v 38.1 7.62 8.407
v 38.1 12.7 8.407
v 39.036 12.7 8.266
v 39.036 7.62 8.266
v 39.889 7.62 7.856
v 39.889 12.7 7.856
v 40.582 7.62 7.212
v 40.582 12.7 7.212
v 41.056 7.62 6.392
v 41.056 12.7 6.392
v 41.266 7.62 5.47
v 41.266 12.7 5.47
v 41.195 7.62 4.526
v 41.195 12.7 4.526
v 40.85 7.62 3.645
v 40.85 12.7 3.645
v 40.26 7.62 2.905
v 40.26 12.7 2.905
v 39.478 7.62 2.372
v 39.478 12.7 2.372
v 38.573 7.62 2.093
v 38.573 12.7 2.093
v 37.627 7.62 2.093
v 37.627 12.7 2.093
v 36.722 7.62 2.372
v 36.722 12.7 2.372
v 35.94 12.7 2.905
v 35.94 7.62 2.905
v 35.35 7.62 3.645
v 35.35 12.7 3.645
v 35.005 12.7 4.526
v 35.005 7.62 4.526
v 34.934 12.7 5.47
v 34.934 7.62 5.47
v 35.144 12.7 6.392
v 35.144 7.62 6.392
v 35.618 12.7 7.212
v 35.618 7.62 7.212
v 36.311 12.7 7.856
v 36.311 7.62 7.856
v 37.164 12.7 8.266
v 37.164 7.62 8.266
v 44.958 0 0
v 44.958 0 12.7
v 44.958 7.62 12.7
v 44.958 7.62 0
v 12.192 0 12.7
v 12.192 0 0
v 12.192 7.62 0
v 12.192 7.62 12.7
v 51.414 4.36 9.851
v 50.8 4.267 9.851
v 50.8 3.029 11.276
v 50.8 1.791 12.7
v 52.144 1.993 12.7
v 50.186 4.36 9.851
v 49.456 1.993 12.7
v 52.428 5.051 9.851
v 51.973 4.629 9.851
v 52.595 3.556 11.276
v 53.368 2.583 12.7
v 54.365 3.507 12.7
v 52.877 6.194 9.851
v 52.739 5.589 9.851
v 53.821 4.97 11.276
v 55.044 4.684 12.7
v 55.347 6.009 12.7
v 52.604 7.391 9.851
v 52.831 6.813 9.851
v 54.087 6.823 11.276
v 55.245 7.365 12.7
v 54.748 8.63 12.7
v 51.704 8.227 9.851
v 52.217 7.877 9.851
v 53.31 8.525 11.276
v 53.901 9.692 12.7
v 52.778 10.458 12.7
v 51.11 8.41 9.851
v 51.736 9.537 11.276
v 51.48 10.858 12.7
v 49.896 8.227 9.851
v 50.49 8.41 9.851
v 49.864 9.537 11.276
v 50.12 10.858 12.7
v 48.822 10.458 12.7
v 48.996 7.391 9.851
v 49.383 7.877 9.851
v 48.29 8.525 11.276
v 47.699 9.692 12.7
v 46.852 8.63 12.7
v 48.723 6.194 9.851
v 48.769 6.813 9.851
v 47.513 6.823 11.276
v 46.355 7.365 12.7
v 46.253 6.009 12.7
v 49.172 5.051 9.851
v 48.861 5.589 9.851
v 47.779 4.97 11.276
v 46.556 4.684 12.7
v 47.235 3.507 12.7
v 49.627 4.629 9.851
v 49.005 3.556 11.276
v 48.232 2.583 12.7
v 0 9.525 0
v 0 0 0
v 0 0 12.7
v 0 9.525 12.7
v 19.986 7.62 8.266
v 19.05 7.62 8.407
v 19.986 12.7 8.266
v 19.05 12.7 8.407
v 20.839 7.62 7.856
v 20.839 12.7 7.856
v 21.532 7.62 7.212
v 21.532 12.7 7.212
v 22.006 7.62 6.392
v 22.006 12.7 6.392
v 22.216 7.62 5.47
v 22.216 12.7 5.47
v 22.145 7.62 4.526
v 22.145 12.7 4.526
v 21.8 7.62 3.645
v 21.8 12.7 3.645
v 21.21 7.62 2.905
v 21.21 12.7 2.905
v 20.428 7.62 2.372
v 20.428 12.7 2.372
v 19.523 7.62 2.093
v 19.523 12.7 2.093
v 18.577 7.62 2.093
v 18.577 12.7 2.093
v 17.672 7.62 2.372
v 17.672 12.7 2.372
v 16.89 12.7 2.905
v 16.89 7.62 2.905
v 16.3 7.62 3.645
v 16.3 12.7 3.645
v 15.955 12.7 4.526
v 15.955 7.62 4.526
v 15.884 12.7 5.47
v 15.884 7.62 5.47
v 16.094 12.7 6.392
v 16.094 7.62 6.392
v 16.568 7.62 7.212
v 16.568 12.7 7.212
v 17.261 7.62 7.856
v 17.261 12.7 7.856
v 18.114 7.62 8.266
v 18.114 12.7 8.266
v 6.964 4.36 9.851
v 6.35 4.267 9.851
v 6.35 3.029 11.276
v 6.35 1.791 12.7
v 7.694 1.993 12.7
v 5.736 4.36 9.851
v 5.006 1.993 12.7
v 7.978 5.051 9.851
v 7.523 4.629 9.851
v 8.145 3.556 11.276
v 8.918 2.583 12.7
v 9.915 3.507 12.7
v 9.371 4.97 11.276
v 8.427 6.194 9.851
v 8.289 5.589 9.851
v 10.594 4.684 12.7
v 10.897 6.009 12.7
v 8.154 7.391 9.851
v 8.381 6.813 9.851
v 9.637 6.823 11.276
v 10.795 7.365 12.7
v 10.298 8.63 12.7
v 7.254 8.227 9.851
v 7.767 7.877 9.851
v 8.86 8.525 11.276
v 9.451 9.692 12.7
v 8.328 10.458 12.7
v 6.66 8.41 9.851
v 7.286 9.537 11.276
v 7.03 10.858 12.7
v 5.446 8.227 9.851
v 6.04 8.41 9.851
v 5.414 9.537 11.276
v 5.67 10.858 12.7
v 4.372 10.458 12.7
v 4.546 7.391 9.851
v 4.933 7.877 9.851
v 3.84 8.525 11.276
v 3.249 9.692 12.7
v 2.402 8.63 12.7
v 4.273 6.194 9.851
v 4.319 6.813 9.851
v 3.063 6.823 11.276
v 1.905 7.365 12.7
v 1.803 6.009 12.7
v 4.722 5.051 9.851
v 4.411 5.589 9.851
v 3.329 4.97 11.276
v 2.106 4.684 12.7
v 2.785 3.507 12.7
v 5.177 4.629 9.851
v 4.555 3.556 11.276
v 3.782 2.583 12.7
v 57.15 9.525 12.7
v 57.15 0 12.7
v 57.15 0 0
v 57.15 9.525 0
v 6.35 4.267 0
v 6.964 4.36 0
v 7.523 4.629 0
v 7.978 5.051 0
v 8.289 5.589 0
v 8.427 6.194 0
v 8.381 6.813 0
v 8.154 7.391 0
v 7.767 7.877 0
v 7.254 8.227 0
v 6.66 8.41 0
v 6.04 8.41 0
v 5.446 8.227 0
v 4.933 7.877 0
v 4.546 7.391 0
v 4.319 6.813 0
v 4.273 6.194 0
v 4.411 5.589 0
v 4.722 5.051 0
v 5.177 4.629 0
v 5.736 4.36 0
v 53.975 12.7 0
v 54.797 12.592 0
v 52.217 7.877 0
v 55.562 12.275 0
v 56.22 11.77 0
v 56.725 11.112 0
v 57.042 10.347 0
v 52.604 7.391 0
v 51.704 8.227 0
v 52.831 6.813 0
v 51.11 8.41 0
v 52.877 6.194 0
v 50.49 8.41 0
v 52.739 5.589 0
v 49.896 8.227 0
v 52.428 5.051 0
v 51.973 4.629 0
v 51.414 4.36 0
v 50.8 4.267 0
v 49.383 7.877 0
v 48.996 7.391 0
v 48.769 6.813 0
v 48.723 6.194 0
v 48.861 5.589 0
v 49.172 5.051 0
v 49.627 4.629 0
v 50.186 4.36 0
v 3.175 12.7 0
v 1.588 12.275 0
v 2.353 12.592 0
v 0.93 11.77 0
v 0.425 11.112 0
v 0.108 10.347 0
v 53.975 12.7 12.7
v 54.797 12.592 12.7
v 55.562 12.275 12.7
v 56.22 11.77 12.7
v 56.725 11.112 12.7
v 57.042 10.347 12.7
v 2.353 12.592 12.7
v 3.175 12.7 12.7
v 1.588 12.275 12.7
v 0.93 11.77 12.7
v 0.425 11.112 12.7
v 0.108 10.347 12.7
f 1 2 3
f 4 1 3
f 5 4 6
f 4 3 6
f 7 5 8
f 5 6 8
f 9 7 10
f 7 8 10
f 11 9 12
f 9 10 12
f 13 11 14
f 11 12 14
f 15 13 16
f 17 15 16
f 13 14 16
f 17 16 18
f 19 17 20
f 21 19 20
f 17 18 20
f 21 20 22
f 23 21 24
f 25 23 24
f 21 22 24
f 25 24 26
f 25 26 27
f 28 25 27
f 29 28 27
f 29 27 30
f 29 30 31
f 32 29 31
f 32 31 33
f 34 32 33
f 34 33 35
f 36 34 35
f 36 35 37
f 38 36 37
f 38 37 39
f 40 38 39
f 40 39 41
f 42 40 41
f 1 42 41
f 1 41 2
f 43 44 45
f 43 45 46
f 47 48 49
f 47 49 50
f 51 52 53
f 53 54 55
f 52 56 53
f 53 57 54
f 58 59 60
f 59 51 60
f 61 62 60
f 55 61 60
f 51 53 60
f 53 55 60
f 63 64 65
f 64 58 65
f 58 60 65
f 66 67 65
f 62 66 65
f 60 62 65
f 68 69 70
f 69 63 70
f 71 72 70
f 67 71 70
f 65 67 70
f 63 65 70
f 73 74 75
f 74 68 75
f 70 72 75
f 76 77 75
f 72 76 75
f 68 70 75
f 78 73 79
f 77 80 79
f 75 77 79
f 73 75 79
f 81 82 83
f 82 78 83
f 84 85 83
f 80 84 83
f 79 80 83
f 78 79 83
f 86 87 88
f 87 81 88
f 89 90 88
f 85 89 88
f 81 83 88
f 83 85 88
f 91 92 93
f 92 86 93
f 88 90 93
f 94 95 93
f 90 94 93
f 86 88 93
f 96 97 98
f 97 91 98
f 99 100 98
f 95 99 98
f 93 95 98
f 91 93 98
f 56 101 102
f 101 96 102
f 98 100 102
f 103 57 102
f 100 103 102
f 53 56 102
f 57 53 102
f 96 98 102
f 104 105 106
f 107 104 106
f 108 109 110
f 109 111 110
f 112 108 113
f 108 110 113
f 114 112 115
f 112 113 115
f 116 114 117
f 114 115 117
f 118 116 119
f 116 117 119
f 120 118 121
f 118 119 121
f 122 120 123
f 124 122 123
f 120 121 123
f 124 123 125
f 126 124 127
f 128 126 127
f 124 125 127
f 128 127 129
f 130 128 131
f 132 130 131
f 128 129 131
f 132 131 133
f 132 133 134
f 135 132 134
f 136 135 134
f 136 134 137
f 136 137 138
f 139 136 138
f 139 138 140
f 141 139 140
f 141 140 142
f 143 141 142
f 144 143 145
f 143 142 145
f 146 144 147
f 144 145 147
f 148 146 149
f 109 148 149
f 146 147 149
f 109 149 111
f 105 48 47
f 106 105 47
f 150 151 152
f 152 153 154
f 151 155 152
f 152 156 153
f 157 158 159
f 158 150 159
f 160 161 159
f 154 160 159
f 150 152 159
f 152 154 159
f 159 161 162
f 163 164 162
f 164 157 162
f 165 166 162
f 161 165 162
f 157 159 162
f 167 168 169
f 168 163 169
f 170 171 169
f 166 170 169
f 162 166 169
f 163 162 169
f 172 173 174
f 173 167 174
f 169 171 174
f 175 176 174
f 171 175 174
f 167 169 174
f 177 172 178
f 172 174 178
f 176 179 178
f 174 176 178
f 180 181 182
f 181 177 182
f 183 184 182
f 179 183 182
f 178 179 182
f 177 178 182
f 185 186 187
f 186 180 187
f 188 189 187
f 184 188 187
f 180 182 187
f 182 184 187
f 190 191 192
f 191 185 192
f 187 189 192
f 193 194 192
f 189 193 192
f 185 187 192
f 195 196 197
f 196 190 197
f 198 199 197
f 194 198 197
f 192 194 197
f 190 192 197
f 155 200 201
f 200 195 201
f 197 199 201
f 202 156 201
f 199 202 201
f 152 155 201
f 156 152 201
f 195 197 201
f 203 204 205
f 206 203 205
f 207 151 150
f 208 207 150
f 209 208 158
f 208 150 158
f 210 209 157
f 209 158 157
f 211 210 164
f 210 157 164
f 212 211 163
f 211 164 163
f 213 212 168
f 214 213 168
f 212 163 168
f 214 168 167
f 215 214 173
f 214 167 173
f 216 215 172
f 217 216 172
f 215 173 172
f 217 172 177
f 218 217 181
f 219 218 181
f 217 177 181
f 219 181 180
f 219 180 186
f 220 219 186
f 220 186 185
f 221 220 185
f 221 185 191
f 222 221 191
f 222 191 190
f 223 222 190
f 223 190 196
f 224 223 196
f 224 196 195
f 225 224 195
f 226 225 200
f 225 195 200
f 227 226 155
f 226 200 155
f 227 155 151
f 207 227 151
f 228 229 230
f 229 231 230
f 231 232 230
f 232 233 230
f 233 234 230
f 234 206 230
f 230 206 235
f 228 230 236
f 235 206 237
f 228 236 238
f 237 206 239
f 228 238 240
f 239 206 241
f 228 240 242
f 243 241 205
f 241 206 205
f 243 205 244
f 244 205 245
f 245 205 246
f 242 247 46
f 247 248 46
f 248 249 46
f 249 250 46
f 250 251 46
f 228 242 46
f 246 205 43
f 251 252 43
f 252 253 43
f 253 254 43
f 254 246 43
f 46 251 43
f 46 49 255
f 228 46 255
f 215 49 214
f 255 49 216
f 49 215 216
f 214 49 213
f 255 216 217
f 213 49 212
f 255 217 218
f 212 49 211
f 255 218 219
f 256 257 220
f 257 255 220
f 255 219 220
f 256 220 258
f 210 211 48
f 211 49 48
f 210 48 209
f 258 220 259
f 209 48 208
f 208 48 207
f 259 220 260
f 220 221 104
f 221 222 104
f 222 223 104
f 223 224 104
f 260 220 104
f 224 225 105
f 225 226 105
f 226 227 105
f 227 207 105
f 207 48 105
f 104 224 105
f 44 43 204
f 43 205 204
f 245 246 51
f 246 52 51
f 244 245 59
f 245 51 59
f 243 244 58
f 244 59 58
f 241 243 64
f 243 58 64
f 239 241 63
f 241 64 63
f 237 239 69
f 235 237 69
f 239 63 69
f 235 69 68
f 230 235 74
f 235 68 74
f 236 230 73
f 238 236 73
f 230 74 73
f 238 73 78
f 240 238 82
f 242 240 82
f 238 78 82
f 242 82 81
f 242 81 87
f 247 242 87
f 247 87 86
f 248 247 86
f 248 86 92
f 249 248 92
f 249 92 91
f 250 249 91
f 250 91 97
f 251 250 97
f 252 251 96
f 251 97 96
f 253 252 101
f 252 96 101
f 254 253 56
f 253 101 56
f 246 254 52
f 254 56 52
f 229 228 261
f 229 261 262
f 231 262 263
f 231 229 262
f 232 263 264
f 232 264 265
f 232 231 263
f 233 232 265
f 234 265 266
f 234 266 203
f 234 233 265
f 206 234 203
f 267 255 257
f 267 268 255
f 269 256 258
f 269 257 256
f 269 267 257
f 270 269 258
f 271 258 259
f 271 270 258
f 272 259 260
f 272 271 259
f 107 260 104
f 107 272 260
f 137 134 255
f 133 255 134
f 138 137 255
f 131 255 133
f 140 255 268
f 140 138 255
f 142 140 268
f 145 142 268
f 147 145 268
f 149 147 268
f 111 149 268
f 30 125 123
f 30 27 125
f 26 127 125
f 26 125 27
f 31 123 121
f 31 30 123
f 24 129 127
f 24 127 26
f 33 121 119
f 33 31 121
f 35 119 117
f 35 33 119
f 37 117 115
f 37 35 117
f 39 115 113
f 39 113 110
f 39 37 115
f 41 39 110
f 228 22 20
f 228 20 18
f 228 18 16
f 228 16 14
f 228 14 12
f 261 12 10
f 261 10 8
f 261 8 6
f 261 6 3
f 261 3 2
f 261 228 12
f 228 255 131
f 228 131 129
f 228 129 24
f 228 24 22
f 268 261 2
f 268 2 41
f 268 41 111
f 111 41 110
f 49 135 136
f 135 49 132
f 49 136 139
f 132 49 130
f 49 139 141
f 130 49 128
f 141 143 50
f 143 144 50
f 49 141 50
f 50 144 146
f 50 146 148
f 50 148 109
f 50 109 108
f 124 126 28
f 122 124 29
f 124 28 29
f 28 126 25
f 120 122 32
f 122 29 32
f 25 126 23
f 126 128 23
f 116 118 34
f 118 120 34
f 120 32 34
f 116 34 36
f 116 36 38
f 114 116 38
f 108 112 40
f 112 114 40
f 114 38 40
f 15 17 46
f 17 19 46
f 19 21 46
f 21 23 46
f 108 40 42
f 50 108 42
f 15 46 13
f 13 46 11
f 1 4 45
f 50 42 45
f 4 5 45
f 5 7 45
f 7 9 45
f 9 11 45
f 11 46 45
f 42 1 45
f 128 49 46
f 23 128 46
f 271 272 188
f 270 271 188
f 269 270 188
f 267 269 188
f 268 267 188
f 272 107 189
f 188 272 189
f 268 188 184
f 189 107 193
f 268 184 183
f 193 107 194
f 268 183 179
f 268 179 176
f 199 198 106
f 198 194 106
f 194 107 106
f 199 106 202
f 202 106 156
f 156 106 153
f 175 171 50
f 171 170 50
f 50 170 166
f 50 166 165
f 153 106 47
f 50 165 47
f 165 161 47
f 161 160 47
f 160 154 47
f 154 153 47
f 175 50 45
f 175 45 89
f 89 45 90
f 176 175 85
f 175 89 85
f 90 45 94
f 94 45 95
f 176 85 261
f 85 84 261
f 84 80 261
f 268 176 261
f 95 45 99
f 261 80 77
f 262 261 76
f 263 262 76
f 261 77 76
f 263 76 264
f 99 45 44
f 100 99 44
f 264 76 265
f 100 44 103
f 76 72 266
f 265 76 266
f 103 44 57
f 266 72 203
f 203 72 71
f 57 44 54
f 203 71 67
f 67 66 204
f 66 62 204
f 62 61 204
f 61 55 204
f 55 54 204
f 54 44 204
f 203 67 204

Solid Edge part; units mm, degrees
sketch "Sketch1" plane through (0, 0, 0) normal (0, -1, 0) x (1, 0, 0)
  line L0 (0, 0) -> (0, 12.7)
  line L1 (0, 12.7) -> (57.15, 12.7)
  line L2 (57.15, 12.7) -> (57.15, 0)
  line L3 (57.15, 0) -> (0, 0)
  dimension "D1" = 57.15
  dimension "D2" = 12.7
extrude "Protrusion1" add sketch "Sketch1" against normal blind 12.7
sketch "Sketch2" plane through (39.624, 0, 4.7625) normal (0, -1, 0) x (1, 0, 0)
  line L0 (-27.432, -4.7625) -> (-27.432, 7.9375)
  line L1 (-27.432, 7.9375) -> (5.334, 7.9375)
  line L2 (5.334, 7.9375) -> (5.334, -4.7625)
  line L3 (5.334, -4.7625) -> (-27.432, -4.7625)
  dimension "D1" = 12.192
  dimension "D2" = 12.192
extrude "ExtrudedCutout_3" cut sketch "Sketch2" against normal blind 7.62
hole "Hole_13" at (50.8, 6.35, 12.7) direction (0, 0, -1) diameter 4.1656 end up to next countersink diameter 9.1186 countersink angle 82
hole "Hole1" at (6.35, 6.35, 12.7) direction (0, 0, -1) diameter 4.1656 end up to next countersink diameter 9.1186 countersink angle 82
hole "Hole_11" at (19.05, 12.7, 5.2324) direction (0, -1, 0) diameter 6.35 end up to next
hole "Hole2" at (38.1, 12.7, 5.2324) direction (0, -1, 0) diameter 6.35 end up to next
fillet "Round_1" radius 3.175 2 edges at (57.15, 12.7, 6.35) (0, 12.7, 6.35)
properties material "Polyethylene, low density"
